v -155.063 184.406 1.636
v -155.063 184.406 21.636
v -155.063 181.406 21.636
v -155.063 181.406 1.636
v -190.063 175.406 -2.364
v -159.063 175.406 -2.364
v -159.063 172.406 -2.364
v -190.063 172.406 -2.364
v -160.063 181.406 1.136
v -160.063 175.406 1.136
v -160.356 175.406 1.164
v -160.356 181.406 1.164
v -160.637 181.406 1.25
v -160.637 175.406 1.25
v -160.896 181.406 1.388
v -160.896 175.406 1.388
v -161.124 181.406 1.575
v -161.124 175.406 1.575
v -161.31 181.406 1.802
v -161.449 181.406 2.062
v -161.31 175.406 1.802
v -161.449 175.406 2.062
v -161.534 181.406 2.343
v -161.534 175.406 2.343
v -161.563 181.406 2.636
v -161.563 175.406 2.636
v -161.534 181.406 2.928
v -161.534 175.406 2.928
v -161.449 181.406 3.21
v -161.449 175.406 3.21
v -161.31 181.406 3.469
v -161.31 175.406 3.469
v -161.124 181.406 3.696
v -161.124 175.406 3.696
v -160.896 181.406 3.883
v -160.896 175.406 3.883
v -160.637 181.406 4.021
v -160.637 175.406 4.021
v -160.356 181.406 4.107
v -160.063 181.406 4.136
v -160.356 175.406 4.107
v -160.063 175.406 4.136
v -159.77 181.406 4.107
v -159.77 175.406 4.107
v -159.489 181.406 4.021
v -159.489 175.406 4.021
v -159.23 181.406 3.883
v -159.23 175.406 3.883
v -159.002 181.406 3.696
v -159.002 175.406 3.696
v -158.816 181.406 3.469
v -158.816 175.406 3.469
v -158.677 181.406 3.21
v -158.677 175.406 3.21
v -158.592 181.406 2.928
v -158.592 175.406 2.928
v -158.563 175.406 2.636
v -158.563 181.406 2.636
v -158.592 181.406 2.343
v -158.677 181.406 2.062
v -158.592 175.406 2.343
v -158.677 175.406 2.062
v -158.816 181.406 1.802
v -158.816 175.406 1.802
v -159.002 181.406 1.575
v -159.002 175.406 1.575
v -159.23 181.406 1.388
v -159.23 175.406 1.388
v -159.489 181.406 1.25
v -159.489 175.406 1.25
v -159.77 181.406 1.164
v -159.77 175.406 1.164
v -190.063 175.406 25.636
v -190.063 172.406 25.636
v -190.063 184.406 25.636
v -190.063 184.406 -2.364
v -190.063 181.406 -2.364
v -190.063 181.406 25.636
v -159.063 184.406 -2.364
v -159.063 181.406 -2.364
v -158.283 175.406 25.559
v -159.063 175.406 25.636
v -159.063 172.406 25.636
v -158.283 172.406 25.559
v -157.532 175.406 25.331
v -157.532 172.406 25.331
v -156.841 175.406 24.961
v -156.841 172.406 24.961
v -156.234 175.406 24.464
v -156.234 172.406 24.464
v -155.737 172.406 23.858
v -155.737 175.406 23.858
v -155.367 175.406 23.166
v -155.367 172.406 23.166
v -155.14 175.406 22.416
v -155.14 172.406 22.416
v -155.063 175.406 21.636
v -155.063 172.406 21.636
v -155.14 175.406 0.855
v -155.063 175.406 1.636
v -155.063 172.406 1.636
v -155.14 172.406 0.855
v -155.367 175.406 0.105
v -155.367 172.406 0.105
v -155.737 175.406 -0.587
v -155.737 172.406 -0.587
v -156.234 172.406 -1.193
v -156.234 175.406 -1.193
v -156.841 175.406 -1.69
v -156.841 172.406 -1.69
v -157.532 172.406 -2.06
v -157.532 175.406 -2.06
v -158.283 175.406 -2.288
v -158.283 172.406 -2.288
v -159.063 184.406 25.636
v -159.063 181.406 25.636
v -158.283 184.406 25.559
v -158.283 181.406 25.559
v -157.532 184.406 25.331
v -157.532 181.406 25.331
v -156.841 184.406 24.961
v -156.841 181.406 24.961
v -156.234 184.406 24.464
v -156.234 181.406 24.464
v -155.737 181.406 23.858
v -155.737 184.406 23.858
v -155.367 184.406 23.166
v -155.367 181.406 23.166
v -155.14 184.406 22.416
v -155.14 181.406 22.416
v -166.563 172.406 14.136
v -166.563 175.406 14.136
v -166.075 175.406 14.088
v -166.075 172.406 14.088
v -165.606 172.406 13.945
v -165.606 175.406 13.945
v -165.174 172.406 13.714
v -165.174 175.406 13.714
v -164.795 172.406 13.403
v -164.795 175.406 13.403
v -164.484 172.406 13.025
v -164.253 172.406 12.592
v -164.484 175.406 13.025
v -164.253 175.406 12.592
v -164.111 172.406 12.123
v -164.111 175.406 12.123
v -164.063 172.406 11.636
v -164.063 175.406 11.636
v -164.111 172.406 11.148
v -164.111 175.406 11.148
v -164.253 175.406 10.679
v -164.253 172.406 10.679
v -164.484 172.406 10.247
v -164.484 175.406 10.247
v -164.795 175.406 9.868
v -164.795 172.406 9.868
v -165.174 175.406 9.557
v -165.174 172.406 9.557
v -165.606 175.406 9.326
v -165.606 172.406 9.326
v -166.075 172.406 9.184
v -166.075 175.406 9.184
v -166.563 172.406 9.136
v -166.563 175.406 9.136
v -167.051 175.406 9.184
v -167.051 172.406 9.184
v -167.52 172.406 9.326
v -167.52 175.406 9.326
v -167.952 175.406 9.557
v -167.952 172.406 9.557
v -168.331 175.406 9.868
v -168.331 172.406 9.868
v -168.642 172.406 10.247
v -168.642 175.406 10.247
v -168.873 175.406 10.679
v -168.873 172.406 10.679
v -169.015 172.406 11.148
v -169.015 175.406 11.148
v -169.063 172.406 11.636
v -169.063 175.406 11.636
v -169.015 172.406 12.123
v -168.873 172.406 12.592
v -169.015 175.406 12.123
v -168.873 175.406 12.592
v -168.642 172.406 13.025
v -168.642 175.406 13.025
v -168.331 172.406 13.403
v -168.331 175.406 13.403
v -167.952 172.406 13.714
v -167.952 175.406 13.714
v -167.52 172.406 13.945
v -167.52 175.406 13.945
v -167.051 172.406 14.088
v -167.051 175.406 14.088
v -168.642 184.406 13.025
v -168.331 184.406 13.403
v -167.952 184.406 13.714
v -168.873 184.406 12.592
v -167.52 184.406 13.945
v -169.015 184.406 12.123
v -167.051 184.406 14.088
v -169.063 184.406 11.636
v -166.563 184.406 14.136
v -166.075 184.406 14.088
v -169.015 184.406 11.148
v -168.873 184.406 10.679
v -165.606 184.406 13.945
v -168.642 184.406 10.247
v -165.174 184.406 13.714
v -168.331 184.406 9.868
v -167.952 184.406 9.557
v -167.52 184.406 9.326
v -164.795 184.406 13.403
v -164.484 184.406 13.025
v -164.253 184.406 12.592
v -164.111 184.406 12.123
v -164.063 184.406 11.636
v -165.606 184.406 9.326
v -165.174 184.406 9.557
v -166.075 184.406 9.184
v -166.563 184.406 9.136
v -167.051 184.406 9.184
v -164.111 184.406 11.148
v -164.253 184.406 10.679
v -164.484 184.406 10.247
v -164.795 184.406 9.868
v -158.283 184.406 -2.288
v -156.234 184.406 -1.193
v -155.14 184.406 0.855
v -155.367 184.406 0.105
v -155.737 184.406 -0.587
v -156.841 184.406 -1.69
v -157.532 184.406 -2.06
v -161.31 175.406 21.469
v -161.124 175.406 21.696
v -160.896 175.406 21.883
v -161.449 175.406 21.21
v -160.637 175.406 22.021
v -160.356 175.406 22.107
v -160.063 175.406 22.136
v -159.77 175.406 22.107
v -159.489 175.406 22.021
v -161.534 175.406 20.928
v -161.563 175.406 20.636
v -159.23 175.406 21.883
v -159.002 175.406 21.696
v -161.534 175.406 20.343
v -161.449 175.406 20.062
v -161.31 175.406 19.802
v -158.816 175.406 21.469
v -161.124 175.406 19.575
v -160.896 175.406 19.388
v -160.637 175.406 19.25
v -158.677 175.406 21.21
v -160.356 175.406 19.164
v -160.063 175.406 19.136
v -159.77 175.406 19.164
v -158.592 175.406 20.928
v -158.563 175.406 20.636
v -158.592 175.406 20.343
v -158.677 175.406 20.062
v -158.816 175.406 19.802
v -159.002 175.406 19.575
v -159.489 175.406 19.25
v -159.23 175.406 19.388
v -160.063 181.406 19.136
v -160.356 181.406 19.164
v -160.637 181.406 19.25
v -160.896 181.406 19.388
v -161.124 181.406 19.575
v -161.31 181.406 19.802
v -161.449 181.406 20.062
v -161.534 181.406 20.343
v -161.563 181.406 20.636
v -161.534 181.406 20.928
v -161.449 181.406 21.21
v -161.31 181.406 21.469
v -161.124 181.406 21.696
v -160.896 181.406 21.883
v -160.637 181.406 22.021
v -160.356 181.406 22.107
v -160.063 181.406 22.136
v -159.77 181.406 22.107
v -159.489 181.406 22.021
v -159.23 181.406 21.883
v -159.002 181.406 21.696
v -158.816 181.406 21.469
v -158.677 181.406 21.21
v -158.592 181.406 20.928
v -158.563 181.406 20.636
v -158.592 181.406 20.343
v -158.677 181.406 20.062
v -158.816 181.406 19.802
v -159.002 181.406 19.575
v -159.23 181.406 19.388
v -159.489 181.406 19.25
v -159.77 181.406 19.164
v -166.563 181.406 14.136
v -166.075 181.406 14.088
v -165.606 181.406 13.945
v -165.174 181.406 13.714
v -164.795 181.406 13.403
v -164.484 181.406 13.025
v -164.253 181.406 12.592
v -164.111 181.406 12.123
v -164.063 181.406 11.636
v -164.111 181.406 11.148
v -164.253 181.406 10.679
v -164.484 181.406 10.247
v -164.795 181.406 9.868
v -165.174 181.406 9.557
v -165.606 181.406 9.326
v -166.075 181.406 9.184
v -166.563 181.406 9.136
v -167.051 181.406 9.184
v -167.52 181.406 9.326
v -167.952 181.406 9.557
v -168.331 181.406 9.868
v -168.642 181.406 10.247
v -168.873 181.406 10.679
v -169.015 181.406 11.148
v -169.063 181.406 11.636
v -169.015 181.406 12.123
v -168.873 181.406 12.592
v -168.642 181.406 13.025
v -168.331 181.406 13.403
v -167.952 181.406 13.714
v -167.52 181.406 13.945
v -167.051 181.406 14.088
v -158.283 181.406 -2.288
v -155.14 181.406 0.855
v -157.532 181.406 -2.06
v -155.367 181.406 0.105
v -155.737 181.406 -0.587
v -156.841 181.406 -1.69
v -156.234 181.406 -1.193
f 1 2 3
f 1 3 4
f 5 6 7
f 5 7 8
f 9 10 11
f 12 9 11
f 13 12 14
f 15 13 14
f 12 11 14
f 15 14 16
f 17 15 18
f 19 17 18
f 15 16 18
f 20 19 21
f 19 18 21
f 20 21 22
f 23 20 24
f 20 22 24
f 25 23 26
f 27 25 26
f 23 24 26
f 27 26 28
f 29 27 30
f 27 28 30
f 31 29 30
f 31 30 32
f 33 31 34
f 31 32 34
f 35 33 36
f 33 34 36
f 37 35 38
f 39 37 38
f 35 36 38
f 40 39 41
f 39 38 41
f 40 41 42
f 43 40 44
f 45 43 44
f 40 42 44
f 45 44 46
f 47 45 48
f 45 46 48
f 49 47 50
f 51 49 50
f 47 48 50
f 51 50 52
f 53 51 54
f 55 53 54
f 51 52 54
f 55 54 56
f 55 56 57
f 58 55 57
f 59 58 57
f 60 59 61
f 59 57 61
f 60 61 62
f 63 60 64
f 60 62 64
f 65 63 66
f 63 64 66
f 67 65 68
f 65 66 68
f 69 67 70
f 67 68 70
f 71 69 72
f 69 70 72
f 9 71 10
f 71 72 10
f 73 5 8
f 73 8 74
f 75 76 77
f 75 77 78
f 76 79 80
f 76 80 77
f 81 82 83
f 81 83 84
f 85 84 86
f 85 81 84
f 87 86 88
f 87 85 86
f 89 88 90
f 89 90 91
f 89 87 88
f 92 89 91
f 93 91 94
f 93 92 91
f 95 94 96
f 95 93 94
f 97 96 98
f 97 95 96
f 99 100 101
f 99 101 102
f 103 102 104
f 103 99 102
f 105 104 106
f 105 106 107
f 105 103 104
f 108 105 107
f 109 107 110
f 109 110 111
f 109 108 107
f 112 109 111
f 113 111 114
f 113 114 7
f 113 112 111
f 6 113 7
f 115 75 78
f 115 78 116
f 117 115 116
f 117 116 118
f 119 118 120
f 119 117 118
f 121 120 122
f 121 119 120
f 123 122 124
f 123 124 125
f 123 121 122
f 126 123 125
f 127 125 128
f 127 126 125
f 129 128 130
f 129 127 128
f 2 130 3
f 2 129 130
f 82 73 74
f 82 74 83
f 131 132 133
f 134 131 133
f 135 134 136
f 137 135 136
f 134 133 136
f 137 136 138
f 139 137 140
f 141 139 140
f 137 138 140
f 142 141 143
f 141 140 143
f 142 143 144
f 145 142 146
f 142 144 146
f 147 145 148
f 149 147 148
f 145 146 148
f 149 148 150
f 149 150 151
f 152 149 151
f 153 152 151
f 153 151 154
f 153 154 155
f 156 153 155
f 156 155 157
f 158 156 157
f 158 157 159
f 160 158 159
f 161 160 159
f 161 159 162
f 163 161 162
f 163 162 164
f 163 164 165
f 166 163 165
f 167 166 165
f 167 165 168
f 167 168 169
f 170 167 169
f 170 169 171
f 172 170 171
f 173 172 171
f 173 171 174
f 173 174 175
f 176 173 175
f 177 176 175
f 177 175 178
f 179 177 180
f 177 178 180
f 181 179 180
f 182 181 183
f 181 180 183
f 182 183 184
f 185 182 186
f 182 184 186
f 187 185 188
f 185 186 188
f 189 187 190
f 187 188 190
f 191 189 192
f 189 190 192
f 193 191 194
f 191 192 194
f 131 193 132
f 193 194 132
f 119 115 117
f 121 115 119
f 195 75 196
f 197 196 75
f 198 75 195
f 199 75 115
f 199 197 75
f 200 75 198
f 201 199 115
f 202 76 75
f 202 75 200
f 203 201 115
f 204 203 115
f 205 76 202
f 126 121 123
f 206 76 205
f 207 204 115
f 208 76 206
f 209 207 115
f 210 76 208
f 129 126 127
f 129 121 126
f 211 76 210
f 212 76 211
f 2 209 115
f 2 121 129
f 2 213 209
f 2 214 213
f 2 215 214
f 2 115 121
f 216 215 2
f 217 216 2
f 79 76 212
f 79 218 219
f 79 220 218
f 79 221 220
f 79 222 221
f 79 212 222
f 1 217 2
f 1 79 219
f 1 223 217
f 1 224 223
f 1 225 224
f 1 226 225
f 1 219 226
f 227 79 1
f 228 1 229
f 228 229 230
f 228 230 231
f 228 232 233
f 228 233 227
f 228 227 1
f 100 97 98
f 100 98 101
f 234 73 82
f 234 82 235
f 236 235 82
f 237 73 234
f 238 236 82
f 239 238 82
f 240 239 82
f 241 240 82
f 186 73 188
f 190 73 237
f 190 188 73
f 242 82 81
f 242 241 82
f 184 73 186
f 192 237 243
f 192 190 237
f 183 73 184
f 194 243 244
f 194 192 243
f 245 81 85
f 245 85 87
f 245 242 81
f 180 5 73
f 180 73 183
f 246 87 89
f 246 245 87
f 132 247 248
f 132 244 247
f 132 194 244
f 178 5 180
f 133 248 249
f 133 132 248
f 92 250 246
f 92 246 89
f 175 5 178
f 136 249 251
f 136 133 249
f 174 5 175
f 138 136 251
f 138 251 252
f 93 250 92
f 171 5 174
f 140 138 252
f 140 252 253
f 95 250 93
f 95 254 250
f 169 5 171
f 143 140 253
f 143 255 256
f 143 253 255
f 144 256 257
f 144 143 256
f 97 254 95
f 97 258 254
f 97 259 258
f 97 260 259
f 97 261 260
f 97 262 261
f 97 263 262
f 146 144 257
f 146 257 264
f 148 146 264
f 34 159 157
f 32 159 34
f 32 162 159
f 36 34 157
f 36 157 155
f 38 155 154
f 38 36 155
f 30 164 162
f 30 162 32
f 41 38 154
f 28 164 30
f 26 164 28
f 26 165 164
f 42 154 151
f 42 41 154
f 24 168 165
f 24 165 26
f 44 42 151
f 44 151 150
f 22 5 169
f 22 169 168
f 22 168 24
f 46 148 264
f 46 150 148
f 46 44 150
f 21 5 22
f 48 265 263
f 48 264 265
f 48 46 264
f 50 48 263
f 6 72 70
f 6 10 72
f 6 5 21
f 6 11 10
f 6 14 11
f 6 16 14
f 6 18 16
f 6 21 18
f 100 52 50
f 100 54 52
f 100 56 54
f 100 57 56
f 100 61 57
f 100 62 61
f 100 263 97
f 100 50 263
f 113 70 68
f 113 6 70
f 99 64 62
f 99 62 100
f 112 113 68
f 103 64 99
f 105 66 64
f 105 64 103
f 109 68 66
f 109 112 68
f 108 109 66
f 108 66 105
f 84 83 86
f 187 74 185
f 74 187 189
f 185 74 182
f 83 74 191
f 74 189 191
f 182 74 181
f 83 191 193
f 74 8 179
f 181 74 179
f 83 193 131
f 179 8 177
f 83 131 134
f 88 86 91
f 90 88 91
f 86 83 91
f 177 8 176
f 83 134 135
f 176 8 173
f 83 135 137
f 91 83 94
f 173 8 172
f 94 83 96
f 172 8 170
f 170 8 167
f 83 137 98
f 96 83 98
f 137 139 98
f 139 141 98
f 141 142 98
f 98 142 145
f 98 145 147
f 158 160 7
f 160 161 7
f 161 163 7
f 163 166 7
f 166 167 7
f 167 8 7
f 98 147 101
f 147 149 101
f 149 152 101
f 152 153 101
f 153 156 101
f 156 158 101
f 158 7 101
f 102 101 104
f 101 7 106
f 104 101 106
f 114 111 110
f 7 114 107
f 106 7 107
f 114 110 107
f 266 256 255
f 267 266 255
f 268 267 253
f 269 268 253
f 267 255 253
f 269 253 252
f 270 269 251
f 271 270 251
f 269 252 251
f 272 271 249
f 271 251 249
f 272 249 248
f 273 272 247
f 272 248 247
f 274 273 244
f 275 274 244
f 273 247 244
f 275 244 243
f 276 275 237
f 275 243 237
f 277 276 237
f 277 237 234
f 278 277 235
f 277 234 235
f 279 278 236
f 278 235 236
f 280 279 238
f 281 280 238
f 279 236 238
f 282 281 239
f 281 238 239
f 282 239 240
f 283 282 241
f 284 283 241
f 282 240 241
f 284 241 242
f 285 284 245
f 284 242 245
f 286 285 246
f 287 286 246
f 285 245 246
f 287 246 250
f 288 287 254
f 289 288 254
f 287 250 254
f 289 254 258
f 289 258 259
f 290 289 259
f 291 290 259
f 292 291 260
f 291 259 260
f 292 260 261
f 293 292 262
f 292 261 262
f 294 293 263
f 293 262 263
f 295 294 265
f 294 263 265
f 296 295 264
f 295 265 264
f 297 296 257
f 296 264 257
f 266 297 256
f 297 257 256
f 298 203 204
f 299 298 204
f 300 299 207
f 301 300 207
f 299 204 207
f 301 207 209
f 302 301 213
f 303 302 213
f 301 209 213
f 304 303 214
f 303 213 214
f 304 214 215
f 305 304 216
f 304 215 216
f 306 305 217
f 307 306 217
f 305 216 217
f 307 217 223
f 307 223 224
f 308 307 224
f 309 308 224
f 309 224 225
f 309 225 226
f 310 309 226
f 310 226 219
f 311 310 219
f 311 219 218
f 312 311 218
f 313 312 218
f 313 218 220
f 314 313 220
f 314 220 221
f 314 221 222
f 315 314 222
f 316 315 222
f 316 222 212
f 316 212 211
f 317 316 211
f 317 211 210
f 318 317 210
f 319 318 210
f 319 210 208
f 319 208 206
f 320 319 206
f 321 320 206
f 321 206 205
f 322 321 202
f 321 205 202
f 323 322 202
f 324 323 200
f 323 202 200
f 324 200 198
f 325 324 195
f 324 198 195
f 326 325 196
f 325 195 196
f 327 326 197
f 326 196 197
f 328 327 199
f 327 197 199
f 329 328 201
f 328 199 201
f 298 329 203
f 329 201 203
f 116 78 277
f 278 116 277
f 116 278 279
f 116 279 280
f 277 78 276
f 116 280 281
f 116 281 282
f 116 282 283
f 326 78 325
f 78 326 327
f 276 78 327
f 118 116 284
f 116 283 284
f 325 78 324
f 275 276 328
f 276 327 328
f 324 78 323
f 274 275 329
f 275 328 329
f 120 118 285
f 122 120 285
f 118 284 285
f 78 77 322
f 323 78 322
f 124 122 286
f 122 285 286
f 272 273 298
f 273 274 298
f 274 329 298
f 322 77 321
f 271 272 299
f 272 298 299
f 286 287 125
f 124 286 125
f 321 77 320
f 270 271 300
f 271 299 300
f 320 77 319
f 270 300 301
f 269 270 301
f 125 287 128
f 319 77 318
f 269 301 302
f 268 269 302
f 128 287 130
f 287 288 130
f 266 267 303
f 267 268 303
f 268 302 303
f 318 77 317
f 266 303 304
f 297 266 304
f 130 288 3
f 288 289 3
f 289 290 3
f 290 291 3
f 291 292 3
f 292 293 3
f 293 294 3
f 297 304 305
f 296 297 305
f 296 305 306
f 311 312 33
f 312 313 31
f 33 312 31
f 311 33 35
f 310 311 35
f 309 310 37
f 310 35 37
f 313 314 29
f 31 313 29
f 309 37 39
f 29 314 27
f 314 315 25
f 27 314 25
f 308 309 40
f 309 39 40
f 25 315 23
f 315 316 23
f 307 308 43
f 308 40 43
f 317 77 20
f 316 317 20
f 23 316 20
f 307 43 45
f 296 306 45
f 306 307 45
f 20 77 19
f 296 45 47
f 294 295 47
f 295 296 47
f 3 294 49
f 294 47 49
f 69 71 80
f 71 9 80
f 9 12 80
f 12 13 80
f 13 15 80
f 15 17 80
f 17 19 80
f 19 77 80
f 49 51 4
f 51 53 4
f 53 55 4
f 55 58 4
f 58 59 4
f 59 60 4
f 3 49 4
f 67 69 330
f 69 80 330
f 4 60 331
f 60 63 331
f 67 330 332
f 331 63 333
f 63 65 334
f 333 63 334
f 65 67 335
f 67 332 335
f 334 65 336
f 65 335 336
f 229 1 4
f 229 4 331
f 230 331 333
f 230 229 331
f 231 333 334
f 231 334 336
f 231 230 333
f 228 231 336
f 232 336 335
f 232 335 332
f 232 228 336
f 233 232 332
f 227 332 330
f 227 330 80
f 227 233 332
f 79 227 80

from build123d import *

# Parameters (mm, degrees)
SALIENTE_EXTRUIR1_DEPTH = 3
CROQUIS2_R              = 1.5
SALIENTE_EXTRUIR2_DEPTH = 6
SALIENTE_EXTRUIR3_START = 3
SALIENTE_EXTRUIR3_DEPTH = 3
CORTAR_EXTRUIR1_REACH   = 194.159
CROQUIS4_R              = 2.5


with BuildPart() as part:
    # Croquis1 → Saliente-Extruir1 (new body)
    with BuildSketch(Plane(origin=(0, 175.405960568, 0), x_dir=(-1, 0, 0), z_dir=(0, -1, 0))):
        with BuildLine():
            Line((159.062896708, 2.364392951), (190.062896708, 2.364392951))
            Line((190.062896708, 2.364392951), (190.062896708, -25.635607049))
            Line((190.062896708, -25.635607049), (159.062896708, -25.635607049))
            ThreePointArc((159.062896708, -25.635607049), (156.234469583, -24.464034173), (155.062896708, -21.635607049))
            Line((155.062896708, -21.635607049), (155.062896708, -1.635607049))
            ThreePointArc((155.062896708, -1.635607049), (156.234469583, 1.192820076), (159.062896708, 2.364392951))
        make_face()
    extrude(amount=SALIENTE_EXTRUIR1_DEPTH)

    # Croquis2 → Saliente-Extruir2 (add)
    with BuildSketch(Plane(origin=(0, 175.405960568, 0), x_dir=(1, 0, 0), z_dir=(0, 1, 0))):
        with Locations(Location((-160.062896708, -2.635607049, 0), (0, 0, 90))):
            Circle(CROQUIS2_R)
        with Locations(Location((-160.062896708, -20.635607049, 0), (0, 0, 90))):
            Circle(CROQUIS2_R)
    extrude(amount=SALIENTE_EXTRUIR2_DEPTH)

    # Croquis3 → Saliente-Extruir3 (add)
    with BuildSketch(Plane(origin=(0, 181.405960568, 0), x_dir=(1, 0, 0), z_dir=(0, 1, 0)).offset(SALIENTE_EXTRUIR3_START)):
        with BuildLine():
            Line((-190.062896708, 2.364392951), (-190.062896708, -25.635607049))
            Line((-190.062896708, -25.635607049), (-159.062896708, -25.635607049))
            ThreePointArc((-159.062896708, -25.635607049), (-156.234469583, -24.464034173), (-155.062896708, -21.635607049))
            Line((-155.062896708, -21.635607049), (-155.062896708, -1.635607049))
            ThreePointArc((-155.062896708, -1.635607049), (-156.234469583, 1.192820076), (-159.062896708, 2.364392951))
            Line((-159.062896708, 2.364392951), (-190.062896708, 2.364392951))
        make_face()
    extrude(amount=-SALIENTE_EXTRUIR3_DEPTH)

    # Cortar-Extruir1: up to this face of the body (flat: up to its plane)
    cortar_extruir1_end = Plane(part.part.faces().sort_by_distance((-172.680086606, 172.405960568, 11.635607049))[0])
    # Croquis4 → Cortar-Extruir1 (cut, up to the picked face)
    with BuildSketch(Plane(origin=(0, 184.405960568, 0), x_dir=(1, 0, 0), z_dir=(0, 1, 0)), mode=Mode.PRIVATE) as cortar_extruir1_sk1:
        with Locations(Location((-166.562896708, -11.635607049, 0), (0, 0, 270))):
            Circle(CROQUIS4_R)
    cortar_extruir1_tool1 = split(extrude(cortar_extruir1_sk1.sketch, amount=-CORTAR_EXTRUIR1_REACH, mode=Mode.PRIVATE), bisect_by=cortar_extruir1_end, keep=Keep.BOTH, mode=Mode.PRIVATE)
    add(cortar_extruir1_tool1.solids().sort_by(Axis((-166.562897, 184.405961, 11.635607), (0, -1, 0)))[0], mode=Mode.SUBTRACT)


solid = part.part
